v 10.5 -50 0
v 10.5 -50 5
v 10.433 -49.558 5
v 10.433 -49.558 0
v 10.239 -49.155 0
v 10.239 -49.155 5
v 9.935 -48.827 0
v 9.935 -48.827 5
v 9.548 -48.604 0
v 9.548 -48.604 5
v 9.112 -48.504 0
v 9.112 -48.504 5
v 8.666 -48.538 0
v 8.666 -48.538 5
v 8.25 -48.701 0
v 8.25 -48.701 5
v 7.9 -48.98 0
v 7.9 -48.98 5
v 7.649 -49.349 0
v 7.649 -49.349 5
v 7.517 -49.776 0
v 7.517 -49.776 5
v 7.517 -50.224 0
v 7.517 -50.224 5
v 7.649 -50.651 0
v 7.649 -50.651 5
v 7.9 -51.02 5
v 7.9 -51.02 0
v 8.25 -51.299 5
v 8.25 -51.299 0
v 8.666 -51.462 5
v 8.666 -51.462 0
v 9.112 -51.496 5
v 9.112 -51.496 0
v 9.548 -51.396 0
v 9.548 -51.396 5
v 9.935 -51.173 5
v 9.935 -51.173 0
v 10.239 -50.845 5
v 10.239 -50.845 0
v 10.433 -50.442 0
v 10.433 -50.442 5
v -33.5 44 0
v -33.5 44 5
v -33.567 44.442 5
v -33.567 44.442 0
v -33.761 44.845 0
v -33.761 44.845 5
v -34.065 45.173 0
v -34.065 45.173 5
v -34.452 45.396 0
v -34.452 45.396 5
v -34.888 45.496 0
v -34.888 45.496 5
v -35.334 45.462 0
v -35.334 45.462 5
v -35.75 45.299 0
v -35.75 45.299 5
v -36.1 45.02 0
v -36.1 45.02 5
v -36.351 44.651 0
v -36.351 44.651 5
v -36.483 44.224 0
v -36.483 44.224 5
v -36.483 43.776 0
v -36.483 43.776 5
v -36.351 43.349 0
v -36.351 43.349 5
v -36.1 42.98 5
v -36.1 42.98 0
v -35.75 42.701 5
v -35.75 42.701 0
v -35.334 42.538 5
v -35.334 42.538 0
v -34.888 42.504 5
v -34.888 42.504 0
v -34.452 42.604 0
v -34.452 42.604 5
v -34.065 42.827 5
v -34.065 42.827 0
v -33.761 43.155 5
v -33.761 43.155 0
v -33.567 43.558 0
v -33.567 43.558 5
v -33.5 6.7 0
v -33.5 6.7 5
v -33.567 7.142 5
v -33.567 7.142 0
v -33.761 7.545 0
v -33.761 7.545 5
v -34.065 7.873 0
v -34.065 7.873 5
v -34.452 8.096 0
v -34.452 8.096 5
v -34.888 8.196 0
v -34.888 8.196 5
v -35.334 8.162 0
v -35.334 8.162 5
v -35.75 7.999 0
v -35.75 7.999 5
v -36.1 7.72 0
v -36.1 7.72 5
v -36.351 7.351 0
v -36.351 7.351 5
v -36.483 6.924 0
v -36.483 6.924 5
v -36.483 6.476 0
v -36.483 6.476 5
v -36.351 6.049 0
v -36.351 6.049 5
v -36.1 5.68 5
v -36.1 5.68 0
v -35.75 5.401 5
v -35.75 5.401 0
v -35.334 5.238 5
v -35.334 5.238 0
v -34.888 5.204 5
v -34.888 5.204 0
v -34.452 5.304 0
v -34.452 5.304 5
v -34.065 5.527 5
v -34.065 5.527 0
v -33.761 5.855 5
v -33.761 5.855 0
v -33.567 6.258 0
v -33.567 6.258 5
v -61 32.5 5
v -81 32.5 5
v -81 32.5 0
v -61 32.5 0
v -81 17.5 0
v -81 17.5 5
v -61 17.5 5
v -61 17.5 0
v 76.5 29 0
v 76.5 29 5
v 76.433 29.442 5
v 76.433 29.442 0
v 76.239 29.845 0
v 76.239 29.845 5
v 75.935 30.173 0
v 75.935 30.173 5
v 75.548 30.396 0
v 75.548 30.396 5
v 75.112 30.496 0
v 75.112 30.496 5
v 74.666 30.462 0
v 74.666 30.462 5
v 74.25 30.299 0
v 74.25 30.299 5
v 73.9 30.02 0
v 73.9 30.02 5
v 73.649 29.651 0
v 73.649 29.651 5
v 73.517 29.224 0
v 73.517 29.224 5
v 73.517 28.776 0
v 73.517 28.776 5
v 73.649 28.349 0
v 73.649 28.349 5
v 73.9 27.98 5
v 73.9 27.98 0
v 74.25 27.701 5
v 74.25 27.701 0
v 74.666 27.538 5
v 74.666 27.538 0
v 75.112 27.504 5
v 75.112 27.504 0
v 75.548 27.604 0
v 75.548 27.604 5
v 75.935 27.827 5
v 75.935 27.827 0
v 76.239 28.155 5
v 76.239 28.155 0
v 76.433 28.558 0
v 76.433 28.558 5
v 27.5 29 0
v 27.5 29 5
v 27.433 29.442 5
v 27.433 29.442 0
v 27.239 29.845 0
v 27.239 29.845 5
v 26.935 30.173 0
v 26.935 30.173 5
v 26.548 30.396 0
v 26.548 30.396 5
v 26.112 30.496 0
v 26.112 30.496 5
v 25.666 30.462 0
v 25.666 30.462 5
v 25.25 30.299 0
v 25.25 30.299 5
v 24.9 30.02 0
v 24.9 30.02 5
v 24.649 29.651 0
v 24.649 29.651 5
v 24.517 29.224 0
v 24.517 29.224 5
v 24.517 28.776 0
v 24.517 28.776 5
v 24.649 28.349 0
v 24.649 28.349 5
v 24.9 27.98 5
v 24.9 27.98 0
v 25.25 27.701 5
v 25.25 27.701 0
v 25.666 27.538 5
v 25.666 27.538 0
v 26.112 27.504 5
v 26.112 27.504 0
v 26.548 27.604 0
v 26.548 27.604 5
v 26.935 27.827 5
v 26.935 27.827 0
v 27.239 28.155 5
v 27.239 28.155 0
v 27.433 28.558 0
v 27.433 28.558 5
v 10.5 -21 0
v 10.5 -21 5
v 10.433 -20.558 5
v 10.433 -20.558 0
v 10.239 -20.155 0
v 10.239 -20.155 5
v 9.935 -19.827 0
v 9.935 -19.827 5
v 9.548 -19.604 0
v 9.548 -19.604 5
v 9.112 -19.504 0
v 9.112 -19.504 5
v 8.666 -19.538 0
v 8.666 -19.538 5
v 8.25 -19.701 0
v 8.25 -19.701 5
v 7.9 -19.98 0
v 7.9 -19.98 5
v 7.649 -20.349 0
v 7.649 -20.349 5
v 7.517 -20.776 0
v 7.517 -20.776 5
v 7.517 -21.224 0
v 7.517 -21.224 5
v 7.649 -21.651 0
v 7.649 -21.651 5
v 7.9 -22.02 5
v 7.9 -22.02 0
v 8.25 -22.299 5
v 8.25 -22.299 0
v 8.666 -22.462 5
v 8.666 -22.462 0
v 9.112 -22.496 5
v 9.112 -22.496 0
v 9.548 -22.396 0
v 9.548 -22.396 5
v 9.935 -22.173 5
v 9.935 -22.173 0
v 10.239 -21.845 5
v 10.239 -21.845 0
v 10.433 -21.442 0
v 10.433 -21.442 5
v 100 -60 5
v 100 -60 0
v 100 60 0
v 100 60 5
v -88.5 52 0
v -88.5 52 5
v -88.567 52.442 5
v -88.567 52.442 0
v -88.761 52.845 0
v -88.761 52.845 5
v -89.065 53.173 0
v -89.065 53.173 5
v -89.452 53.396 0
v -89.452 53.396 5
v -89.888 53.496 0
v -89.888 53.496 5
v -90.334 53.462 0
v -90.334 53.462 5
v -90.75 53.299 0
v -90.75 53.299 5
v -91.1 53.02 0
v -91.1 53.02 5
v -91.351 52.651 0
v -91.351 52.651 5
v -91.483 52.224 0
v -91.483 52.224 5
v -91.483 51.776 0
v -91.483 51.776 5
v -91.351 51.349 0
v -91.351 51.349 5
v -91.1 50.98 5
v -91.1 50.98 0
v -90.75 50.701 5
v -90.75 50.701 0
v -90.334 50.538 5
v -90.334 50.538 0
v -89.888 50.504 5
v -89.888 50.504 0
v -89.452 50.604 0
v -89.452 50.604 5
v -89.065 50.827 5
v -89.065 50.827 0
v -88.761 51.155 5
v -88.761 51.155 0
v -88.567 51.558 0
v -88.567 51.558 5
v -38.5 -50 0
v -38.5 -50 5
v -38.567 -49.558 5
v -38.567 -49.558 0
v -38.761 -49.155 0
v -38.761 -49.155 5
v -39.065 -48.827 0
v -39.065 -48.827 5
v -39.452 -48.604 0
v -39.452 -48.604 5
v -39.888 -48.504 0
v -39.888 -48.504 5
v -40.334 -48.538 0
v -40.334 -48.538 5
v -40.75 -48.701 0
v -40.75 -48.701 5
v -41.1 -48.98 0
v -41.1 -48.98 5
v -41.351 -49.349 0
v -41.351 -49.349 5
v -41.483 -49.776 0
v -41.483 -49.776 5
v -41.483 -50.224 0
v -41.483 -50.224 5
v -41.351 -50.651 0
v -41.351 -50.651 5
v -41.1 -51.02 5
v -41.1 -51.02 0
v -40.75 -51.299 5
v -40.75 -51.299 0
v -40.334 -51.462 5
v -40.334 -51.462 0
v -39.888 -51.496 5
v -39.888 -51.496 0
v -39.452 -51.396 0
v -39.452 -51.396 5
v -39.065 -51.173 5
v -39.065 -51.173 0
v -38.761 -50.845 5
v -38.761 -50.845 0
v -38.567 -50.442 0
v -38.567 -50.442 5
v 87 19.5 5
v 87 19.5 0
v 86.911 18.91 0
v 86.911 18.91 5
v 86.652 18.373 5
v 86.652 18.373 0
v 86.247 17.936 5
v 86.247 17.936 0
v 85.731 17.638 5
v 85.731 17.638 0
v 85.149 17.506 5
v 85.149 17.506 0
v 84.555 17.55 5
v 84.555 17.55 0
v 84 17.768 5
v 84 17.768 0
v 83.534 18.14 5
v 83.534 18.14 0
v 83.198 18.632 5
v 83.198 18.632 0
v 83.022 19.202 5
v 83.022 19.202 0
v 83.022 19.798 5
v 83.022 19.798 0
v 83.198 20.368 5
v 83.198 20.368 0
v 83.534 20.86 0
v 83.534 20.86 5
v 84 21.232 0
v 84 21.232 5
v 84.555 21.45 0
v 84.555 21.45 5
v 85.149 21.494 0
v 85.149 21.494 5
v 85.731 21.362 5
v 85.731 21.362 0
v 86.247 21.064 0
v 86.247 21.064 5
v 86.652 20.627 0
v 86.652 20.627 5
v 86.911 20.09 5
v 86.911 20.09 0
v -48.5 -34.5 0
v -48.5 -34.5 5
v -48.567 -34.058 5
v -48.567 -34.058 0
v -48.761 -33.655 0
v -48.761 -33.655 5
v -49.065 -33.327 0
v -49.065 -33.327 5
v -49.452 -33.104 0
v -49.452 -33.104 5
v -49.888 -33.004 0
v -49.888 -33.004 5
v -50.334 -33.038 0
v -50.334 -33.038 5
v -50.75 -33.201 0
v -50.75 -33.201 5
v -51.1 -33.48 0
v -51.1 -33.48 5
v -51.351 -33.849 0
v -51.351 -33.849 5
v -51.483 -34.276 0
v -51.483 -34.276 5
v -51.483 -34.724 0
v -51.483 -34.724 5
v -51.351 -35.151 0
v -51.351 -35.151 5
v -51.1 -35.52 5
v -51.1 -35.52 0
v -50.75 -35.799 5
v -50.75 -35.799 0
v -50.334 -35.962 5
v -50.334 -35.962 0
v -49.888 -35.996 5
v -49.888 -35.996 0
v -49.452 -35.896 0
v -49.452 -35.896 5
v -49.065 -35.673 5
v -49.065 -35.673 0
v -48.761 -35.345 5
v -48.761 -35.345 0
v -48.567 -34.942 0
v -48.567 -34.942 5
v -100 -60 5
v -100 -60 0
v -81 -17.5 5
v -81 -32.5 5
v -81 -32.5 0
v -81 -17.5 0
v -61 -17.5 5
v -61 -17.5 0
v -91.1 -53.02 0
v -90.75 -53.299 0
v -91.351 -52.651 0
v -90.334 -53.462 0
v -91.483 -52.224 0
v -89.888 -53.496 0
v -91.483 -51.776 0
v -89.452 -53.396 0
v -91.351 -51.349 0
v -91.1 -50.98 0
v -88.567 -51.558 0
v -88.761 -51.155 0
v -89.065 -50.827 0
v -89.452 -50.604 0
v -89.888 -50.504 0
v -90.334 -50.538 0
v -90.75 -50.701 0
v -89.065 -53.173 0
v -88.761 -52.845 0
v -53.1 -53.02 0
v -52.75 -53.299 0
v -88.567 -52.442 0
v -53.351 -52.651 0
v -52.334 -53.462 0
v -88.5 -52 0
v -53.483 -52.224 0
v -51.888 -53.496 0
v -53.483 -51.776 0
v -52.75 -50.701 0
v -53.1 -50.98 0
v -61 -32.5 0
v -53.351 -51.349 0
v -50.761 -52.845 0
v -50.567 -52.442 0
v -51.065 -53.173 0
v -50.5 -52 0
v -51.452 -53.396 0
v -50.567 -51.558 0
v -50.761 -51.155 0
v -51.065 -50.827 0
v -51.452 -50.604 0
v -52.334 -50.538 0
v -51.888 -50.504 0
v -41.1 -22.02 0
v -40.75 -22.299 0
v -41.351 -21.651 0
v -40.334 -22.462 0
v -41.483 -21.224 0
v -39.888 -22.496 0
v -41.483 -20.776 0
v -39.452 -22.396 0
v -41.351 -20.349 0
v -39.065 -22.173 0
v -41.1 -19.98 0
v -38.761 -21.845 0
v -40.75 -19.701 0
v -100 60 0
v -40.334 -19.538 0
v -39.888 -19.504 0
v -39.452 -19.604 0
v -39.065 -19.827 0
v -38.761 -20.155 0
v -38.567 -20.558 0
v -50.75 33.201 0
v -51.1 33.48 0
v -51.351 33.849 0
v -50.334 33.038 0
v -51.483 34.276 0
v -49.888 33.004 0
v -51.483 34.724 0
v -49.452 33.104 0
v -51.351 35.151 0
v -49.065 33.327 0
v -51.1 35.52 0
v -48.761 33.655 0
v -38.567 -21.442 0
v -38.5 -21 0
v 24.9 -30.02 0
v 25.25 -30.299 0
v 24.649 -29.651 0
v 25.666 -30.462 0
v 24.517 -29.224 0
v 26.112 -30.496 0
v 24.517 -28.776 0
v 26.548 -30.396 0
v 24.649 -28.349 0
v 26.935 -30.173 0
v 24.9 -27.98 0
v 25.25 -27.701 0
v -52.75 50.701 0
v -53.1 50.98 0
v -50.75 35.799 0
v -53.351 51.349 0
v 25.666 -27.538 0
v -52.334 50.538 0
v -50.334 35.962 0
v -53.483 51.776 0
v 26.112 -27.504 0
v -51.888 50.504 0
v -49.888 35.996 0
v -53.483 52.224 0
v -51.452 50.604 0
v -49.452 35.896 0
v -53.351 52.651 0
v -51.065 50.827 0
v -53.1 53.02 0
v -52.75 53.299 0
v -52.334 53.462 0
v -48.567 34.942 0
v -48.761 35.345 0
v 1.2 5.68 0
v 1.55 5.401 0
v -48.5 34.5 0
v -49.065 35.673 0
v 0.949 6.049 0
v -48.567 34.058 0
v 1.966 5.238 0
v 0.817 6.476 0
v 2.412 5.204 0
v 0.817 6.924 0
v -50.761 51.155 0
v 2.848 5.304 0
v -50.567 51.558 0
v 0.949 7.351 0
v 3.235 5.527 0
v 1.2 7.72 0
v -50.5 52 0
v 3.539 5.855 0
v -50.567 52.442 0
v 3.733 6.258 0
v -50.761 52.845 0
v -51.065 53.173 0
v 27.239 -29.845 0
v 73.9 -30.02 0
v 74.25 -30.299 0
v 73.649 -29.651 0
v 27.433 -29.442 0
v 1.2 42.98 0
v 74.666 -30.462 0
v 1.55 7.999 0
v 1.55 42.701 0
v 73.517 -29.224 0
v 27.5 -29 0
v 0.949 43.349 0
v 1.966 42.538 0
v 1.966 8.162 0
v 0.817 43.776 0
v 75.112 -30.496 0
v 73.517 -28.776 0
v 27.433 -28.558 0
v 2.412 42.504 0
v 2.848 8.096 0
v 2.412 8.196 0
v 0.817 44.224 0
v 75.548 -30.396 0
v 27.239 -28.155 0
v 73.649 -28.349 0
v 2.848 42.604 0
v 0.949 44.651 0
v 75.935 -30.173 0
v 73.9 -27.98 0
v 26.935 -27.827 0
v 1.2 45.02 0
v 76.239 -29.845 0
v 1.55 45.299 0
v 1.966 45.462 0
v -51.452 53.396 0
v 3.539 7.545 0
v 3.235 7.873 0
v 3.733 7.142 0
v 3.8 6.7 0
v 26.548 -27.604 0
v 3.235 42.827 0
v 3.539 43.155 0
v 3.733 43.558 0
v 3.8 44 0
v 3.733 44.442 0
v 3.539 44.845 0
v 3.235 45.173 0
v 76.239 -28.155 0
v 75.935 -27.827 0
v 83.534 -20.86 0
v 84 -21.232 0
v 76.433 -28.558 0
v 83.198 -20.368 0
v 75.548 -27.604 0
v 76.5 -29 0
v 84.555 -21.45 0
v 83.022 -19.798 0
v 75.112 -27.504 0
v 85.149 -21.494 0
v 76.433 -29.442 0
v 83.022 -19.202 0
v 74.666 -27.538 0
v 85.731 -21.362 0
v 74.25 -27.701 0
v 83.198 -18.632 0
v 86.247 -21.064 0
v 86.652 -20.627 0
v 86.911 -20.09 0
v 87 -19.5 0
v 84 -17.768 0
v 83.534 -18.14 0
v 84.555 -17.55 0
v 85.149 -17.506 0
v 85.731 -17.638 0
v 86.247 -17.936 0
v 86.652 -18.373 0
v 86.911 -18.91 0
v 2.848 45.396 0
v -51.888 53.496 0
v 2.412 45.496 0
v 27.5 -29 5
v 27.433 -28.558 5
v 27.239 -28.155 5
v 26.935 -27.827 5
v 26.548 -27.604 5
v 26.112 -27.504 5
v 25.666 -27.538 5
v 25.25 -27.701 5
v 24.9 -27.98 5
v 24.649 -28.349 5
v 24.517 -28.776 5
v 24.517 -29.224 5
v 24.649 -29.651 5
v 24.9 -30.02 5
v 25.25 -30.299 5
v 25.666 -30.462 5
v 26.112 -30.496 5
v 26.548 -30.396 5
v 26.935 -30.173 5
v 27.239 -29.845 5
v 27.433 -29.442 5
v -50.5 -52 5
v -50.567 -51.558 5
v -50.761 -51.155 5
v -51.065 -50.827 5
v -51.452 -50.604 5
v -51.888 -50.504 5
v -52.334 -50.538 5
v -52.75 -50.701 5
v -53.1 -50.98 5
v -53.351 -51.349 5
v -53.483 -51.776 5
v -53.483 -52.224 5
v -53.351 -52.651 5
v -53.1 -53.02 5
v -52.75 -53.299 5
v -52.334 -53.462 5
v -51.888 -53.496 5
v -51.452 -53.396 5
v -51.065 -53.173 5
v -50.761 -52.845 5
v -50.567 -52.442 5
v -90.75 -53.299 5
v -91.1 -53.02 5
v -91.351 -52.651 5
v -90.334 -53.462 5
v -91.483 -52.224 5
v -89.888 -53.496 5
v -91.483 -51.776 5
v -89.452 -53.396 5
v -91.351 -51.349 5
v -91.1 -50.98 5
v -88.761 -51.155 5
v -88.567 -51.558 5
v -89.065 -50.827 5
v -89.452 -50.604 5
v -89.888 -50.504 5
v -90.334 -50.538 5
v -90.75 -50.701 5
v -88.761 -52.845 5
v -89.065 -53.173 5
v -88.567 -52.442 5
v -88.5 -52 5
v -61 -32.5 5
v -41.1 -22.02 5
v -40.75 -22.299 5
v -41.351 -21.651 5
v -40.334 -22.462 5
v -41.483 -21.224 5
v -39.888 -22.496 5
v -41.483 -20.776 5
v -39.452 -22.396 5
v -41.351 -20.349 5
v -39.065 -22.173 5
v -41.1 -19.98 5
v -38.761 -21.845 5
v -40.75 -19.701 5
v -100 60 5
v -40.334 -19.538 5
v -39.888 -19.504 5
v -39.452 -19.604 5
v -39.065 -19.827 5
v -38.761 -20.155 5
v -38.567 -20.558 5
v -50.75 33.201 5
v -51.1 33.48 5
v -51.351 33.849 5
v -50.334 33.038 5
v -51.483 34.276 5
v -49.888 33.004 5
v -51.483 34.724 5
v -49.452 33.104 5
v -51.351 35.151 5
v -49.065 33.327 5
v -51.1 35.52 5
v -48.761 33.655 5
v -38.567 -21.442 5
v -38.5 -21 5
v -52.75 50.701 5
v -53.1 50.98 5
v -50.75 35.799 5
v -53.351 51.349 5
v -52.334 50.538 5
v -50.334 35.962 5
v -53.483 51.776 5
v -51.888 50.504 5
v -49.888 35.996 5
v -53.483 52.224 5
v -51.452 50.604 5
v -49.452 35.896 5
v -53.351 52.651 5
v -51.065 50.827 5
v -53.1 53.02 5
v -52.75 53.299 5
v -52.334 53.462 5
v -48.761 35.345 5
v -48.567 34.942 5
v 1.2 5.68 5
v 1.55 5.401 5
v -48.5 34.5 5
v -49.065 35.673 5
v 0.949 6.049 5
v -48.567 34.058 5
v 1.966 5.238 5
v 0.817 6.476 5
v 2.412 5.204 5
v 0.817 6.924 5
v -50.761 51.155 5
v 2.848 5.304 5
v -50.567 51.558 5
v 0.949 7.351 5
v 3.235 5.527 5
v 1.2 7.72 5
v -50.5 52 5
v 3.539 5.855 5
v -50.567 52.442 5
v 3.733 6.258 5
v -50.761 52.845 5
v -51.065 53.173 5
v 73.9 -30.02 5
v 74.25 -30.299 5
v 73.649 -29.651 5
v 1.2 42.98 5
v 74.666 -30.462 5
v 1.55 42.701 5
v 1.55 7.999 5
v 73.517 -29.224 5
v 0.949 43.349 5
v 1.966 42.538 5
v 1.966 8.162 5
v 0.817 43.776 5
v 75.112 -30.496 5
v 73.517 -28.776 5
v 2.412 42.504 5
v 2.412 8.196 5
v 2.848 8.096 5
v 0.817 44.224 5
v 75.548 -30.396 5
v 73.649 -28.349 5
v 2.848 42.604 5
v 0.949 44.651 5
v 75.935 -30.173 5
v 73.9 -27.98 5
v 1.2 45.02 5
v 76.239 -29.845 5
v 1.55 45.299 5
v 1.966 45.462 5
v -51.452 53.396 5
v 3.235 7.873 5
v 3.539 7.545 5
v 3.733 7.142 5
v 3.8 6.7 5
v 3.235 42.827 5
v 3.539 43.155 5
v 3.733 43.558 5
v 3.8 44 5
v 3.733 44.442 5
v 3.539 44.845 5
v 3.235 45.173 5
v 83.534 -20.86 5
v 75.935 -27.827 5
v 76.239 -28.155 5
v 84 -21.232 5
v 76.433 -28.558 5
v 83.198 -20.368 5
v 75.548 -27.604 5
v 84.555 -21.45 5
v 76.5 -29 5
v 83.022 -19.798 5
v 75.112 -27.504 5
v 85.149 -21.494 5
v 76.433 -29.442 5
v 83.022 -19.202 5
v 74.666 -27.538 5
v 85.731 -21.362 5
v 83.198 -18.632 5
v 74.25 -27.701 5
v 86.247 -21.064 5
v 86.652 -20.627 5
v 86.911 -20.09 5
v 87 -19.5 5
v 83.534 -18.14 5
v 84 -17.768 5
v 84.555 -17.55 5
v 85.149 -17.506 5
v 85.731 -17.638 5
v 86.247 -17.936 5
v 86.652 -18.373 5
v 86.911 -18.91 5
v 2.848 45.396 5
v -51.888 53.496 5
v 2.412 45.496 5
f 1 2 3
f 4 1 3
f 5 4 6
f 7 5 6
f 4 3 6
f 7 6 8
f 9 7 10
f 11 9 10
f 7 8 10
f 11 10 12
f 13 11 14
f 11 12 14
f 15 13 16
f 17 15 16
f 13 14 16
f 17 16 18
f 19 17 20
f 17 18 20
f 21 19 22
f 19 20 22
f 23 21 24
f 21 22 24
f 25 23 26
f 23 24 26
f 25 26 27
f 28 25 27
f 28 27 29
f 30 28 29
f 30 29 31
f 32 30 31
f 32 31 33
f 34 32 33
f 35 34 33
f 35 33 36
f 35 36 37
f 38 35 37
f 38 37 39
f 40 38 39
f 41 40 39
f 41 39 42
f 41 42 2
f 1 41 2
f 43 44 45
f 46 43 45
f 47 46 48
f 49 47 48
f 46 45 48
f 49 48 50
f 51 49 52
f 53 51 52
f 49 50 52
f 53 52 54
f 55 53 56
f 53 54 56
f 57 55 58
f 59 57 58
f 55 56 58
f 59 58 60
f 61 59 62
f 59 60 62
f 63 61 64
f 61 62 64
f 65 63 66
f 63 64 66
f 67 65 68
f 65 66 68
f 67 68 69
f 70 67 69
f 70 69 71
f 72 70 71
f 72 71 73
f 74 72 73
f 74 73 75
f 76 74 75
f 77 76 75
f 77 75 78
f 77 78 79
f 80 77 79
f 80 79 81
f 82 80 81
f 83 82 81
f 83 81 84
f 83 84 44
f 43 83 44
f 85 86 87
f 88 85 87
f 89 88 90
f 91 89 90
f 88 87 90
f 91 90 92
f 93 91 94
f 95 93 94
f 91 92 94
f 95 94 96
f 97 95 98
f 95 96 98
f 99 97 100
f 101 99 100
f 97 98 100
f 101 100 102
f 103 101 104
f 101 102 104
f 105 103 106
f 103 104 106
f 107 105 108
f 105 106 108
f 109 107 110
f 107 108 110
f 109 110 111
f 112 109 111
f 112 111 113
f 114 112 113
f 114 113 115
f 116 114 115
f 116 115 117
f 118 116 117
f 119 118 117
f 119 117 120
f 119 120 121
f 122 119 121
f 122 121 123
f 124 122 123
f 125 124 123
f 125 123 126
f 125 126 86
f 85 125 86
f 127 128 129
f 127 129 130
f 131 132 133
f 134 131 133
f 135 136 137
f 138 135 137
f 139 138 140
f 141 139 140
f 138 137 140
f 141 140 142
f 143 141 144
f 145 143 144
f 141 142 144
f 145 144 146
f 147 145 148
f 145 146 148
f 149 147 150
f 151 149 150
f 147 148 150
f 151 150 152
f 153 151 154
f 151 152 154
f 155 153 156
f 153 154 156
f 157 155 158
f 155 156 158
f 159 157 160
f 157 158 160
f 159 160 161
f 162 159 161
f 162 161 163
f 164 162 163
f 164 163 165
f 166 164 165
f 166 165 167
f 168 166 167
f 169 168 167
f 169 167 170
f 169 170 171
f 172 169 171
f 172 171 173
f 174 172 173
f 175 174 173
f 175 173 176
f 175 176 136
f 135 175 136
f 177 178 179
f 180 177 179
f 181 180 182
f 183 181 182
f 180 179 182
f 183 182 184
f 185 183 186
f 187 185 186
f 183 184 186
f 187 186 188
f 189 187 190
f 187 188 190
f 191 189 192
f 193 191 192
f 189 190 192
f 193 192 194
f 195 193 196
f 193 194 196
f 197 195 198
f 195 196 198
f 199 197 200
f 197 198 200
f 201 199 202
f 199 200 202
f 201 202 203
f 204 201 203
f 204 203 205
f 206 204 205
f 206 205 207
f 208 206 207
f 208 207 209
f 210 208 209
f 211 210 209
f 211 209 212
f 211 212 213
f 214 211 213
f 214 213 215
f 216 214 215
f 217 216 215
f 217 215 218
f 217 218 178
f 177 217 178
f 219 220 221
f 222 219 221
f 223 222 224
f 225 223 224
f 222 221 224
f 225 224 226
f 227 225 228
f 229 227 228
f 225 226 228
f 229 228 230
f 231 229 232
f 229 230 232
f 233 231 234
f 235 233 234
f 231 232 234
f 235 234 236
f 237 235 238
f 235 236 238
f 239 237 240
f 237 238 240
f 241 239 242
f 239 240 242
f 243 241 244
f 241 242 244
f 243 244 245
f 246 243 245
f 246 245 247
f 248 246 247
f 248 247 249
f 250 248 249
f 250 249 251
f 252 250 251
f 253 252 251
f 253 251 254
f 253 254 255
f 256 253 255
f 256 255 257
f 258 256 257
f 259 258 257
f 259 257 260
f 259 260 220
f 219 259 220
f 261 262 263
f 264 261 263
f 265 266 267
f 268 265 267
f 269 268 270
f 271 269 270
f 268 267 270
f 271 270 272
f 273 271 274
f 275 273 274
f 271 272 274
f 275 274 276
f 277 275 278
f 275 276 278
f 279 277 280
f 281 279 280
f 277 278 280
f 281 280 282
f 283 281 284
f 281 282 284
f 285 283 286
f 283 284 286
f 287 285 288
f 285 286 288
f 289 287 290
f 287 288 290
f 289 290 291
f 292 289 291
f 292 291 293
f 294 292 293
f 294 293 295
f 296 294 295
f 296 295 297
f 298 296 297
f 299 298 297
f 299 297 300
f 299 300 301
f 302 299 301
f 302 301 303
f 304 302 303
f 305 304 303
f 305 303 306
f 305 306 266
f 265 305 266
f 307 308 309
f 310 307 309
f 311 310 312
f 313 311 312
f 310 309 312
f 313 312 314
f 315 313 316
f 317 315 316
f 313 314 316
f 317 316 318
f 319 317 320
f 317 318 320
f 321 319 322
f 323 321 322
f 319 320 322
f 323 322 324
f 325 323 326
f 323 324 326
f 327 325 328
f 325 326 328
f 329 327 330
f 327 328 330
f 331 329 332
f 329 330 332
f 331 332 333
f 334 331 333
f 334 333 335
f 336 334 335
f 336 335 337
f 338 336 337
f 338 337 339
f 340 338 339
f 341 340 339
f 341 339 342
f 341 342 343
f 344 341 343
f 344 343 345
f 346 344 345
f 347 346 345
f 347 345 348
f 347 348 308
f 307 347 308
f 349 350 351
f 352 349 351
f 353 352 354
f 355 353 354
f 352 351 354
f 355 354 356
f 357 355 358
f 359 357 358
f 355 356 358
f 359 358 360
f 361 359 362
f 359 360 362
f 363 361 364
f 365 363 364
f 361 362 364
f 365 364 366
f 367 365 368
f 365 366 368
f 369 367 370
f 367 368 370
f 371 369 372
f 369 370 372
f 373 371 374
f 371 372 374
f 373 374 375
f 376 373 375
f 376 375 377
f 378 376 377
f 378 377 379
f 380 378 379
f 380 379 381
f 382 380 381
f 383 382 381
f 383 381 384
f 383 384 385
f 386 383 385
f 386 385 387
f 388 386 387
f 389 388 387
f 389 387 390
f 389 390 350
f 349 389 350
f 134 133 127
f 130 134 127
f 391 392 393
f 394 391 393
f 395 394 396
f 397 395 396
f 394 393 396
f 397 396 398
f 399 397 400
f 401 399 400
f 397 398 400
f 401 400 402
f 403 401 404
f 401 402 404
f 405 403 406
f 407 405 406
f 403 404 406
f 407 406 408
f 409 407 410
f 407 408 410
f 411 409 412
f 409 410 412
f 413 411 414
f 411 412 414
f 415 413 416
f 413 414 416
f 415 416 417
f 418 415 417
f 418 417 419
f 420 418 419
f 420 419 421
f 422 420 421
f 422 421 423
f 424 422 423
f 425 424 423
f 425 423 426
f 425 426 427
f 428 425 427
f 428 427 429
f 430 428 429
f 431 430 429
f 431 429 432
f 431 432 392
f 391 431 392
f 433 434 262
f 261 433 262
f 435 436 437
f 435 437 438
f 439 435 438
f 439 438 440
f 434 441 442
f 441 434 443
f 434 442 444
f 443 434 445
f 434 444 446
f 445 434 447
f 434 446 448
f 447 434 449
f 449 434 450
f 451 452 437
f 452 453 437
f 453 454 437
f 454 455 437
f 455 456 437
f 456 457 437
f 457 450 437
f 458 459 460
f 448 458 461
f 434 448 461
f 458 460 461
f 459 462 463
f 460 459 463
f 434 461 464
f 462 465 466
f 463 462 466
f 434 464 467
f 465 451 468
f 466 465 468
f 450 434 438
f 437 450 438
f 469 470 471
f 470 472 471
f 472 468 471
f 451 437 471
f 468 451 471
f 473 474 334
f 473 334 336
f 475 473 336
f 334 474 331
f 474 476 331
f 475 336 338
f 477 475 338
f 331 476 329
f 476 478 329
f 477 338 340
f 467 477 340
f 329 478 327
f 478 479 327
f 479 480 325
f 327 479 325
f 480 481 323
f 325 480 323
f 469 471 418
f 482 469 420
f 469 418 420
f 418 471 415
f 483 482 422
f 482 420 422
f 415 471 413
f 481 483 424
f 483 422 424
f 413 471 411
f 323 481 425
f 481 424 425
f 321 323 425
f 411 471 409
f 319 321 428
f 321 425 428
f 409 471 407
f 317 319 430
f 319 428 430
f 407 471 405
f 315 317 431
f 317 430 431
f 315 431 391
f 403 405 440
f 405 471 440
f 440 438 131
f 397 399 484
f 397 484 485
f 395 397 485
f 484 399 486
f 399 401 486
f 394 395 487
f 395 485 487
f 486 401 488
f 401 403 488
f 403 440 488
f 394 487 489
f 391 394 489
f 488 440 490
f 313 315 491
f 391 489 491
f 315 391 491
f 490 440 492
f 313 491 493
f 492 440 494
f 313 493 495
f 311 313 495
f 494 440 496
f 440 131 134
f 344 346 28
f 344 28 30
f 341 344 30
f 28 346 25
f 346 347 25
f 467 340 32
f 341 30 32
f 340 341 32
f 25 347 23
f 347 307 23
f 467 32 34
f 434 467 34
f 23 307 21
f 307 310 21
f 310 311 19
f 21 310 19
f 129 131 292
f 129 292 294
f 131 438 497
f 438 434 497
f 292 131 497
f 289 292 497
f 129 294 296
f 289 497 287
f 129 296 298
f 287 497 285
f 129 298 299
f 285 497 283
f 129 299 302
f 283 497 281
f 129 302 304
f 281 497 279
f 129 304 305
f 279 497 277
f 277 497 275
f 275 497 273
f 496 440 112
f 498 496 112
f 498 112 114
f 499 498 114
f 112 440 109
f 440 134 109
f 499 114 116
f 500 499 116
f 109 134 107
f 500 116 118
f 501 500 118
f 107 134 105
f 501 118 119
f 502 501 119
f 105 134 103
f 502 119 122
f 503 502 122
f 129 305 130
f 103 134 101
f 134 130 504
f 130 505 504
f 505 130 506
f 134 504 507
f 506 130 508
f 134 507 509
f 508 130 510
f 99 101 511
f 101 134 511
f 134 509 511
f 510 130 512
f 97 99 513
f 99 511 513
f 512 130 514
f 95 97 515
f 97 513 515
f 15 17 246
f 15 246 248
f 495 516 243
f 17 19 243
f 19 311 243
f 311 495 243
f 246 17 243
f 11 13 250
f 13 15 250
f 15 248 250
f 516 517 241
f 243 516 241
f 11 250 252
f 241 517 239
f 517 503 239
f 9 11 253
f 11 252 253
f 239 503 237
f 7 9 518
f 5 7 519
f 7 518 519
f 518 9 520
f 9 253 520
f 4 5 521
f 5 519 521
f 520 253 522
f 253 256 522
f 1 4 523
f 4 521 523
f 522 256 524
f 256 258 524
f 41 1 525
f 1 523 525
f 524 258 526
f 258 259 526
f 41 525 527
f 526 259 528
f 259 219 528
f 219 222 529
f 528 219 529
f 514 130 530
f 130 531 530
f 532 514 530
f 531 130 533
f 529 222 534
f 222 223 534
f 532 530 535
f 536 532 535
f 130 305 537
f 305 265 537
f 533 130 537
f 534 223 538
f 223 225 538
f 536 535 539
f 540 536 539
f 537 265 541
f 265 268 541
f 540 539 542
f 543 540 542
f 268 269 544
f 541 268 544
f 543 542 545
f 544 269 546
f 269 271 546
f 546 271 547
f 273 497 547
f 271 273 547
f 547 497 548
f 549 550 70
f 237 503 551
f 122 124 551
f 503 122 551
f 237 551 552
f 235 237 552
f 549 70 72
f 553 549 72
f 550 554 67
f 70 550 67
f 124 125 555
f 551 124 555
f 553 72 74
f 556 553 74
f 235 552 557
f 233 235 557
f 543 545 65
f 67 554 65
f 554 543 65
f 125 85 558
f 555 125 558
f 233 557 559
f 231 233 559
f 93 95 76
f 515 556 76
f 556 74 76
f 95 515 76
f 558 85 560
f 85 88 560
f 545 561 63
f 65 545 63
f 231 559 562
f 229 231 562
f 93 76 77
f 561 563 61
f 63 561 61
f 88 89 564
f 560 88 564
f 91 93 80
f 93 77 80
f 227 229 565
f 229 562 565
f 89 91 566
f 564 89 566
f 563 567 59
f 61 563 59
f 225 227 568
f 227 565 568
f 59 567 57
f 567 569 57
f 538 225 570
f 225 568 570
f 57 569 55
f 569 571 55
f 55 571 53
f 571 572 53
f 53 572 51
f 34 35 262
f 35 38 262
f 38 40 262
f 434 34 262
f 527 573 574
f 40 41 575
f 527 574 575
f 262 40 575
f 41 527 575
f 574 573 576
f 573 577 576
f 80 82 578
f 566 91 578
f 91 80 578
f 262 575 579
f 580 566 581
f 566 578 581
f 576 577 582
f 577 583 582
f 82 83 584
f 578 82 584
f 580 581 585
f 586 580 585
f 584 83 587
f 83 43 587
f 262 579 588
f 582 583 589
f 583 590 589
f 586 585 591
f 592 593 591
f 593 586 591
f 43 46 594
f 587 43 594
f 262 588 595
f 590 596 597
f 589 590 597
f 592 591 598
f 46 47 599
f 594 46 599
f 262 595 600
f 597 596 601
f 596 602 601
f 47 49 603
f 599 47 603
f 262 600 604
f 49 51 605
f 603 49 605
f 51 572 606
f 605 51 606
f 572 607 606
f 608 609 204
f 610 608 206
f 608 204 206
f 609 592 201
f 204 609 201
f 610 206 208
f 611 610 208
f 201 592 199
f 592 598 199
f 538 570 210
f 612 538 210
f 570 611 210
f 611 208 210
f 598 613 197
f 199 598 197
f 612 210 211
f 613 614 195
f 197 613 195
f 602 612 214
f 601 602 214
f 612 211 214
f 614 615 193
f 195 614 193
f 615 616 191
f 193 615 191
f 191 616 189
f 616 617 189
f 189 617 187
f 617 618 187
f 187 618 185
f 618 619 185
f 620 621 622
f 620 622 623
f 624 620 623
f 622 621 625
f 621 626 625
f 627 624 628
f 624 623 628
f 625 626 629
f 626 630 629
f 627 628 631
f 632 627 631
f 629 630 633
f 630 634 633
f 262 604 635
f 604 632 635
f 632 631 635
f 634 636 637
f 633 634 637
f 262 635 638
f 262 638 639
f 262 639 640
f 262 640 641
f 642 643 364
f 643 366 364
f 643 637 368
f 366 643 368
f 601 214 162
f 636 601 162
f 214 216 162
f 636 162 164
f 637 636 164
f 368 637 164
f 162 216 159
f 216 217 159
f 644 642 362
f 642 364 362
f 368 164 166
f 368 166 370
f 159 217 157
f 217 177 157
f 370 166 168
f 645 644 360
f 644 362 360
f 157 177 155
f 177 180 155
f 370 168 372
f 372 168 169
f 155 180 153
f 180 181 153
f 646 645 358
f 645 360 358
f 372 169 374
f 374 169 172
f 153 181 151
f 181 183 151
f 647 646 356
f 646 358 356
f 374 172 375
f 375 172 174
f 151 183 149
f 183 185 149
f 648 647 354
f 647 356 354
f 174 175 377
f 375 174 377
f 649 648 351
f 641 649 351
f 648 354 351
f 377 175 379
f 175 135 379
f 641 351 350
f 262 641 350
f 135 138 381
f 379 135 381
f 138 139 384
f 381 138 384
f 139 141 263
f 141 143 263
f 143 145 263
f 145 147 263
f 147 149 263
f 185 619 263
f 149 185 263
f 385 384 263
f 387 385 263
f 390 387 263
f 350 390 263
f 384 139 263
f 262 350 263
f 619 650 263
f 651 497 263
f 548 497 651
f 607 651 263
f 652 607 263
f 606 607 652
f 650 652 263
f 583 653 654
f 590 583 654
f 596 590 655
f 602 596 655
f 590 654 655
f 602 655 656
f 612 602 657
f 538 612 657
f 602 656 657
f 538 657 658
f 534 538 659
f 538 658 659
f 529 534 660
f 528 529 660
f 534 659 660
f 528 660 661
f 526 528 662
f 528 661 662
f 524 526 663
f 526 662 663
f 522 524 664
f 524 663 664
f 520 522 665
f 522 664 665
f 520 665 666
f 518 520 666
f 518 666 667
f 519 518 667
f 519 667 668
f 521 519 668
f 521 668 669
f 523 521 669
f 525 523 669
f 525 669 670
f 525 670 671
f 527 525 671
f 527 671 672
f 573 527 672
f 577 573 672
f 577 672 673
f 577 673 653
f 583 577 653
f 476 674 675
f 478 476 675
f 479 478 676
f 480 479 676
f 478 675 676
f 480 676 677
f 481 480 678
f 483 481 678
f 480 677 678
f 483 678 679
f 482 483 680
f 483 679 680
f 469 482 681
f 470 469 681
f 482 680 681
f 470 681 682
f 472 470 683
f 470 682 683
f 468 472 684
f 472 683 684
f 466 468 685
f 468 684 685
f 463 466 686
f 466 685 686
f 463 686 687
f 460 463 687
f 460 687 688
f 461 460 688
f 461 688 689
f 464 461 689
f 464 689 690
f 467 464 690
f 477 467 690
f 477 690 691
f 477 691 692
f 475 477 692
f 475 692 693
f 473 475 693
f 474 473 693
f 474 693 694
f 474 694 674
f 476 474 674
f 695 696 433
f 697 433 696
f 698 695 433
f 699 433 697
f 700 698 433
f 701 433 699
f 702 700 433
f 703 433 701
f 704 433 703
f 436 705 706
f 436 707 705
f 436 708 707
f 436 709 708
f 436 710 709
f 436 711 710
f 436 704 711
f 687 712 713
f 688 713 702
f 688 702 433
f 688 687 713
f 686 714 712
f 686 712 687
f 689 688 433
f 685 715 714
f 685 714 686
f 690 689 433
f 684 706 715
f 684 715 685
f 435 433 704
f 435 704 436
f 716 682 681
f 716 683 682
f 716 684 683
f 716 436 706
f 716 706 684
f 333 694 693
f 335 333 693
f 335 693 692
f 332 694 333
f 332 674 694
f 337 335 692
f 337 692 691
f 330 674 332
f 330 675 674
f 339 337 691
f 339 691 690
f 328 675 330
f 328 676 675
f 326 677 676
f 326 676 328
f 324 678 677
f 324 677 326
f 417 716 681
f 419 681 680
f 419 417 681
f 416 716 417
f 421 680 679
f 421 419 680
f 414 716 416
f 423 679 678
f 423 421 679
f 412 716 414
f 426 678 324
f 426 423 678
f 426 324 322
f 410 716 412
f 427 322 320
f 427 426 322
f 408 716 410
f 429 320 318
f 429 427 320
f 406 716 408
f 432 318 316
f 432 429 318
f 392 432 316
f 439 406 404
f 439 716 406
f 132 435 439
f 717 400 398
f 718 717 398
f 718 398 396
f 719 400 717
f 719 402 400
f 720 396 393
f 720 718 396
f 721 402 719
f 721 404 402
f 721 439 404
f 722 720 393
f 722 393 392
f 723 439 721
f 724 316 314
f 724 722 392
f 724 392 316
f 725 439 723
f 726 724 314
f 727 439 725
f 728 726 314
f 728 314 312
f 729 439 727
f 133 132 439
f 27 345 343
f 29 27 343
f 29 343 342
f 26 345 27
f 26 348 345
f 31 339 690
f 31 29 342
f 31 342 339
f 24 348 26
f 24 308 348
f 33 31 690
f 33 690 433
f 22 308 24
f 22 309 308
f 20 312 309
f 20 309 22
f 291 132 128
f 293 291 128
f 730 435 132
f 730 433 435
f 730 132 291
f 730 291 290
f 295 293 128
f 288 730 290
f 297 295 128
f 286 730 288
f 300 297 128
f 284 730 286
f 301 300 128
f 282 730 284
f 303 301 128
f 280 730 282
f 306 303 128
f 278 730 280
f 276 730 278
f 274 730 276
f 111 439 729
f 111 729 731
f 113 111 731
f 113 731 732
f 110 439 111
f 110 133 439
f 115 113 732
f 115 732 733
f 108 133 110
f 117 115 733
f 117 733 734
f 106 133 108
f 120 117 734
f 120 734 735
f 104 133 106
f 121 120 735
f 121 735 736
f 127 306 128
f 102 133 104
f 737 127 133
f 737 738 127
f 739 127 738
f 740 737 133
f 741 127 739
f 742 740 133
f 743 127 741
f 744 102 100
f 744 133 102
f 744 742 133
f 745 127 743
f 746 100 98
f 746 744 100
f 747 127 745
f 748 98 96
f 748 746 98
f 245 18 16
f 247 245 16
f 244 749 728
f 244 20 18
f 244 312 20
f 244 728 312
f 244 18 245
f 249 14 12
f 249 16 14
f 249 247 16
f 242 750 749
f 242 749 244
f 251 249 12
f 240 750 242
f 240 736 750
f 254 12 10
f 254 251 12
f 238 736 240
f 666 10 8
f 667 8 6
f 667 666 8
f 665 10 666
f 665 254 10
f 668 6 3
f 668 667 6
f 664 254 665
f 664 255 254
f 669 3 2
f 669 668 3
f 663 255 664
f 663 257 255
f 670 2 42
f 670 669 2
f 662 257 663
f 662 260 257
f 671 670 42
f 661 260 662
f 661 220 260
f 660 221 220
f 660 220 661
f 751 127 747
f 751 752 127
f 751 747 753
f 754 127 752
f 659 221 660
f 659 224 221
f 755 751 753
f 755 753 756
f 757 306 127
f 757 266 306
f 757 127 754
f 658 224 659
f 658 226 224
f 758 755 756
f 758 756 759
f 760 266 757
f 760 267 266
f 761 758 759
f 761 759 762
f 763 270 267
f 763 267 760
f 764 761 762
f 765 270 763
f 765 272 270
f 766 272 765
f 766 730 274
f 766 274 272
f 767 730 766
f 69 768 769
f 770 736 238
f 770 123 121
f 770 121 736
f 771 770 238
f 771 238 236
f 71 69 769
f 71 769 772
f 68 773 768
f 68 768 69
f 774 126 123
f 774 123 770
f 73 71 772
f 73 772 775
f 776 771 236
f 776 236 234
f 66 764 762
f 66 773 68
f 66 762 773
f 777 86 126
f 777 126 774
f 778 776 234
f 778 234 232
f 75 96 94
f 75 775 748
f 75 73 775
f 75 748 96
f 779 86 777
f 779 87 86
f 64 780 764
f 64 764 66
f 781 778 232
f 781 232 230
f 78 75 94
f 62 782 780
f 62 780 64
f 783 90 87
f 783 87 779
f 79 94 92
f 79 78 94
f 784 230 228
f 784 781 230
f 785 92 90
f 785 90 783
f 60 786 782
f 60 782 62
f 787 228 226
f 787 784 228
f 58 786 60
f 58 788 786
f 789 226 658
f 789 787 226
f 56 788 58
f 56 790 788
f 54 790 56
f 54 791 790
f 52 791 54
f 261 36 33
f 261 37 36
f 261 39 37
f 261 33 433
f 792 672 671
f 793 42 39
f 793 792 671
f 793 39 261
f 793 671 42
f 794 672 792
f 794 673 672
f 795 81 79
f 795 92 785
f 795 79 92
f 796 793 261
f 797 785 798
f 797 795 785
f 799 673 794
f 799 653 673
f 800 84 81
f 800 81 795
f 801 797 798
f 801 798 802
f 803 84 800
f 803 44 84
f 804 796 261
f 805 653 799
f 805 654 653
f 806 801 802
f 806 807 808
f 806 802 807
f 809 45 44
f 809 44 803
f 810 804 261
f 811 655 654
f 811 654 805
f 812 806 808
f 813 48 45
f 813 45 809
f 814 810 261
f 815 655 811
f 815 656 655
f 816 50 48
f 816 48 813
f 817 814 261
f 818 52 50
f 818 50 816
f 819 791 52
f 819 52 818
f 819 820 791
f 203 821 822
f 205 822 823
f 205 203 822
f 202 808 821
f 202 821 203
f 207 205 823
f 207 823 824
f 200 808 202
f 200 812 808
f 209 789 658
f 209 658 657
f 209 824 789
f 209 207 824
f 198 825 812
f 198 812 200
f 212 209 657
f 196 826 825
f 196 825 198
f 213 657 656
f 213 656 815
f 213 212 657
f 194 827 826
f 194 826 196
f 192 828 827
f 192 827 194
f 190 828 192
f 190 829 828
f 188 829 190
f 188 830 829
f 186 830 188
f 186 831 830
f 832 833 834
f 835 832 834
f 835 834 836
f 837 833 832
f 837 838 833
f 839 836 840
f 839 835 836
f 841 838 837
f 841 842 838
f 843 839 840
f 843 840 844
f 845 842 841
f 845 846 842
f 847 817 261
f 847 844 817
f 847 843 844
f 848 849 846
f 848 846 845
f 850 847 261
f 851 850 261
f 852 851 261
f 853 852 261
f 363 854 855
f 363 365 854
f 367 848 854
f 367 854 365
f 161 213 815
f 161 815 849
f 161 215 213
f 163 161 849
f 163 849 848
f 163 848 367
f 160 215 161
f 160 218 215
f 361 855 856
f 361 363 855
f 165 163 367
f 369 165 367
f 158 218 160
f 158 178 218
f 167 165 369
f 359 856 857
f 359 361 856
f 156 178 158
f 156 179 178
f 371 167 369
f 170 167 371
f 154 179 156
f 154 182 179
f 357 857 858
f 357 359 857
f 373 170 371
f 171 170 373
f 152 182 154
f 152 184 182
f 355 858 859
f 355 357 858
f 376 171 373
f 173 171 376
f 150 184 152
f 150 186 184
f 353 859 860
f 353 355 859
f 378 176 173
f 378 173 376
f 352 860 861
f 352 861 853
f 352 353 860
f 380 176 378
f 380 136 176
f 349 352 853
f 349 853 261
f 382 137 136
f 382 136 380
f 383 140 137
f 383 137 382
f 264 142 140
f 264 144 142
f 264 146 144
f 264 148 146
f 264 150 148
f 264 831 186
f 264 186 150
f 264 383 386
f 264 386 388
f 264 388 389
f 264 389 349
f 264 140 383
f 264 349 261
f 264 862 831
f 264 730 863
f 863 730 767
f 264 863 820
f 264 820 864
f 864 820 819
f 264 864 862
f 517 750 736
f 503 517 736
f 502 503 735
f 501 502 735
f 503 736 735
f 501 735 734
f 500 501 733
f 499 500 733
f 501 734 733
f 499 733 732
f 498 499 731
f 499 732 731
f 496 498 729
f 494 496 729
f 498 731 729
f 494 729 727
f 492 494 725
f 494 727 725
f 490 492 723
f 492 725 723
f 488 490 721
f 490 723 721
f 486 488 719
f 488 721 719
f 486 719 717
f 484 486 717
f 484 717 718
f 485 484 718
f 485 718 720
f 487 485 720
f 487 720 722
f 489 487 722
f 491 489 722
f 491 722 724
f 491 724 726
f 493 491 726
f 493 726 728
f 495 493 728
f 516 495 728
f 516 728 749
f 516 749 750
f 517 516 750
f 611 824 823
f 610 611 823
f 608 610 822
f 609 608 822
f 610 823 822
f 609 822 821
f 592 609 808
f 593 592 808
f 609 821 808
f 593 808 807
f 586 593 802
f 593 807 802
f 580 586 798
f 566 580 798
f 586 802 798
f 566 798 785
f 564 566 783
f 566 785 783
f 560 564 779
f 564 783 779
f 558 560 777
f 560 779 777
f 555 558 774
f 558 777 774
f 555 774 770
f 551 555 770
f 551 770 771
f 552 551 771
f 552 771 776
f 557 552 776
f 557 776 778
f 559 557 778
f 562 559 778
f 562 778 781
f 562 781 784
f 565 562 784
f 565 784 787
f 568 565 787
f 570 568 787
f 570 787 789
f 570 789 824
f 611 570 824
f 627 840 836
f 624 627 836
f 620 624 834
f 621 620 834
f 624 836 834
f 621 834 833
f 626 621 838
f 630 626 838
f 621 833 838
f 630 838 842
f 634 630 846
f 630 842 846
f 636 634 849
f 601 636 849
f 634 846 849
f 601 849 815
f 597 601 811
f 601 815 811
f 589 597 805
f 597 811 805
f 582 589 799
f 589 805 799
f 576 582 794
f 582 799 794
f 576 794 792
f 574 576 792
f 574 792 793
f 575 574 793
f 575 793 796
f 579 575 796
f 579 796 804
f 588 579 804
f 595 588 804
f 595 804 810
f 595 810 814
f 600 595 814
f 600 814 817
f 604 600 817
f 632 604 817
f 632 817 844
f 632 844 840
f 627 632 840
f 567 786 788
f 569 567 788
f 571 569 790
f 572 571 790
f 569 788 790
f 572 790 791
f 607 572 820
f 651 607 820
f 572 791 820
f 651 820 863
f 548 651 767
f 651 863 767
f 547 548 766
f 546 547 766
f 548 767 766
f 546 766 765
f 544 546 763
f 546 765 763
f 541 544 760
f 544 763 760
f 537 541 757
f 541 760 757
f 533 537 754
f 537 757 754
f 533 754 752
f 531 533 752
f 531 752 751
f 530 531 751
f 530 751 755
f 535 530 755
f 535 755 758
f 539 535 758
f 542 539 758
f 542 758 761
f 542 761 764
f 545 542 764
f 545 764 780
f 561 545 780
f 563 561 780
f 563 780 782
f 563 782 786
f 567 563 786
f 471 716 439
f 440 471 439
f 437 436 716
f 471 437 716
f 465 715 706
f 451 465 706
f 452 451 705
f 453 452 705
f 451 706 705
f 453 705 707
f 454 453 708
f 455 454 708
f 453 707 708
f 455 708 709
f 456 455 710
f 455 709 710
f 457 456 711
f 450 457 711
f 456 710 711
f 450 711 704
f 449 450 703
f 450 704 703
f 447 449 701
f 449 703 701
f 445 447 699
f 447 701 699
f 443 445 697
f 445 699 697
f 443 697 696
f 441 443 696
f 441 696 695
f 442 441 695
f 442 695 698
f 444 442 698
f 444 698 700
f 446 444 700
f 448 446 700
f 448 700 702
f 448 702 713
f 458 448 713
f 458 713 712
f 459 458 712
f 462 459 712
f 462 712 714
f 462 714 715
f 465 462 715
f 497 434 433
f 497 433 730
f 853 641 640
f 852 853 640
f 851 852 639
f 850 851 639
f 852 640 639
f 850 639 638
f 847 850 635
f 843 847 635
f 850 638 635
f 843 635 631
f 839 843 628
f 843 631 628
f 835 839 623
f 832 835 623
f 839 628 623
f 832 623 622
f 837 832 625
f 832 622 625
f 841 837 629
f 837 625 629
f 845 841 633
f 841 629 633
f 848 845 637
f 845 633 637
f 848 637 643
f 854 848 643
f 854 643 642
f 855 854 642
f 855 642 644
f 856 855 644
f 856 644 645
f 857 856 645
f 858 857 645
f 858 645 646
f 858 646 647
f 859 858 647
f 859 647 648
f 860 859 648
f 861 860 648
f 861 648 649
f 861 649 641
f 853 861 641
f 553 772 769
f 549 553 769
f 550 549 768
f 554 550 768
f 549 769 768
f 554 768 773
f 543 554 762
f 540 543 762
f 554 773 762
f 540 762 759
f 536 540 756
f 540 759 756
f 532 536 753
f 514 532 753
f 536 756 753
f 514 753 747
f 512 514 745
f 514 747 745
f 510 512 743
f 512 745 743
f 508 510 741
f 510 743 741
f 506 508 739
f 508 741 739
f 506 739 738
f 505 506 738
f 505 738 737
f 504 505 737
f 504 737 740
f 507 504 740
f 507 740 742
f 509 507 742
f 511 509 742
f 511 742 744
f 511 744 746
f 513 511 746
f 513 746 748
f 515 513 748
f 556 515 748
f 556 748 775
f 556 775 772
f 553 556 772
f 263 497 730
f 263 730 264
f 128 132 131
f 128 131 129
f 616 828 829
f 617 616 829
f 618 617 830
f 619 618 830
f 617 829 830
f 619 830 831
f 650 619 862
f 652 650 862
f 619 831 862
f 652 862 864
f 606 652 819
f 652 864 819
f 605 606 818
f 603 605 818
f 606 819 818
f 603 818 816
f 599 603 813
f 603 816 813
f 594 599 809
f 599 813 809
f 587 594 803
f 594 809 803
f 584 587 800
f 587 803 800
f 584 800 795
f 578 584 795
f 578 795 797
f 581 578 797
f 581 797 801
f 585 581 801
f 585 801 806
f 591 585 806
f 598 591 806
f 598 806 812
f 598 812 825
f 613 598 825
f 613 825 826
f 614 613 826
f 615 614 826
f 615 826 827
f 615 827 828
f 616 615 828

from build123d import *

# Parameters (mm, degrees)
F0_W      = 200
F0_H      = 120
F1_DEPTH  = 5
F2_R      = 1.5
F2_W      = 20
F2_H      = 15
F3_DEPTH  = 25
F4_R      = 1.5
F5_DEPTH  = 5.001
F6_R      = 2
F7_DEPTH  = 5.001
F8_R      = 1.5
F9_DEPTH  = 5.001
F10_R     = 1.5
F11_DEPTH = 5.001
F12_R     = 1.5
F13_DEPTH = 5.001


with BuildPart() as f1:
    # F0 (on Top) → F1 (new body)
    with BuildSketch(Plane.XY):
        Rectangle(F0_W, F0_H)
    extrude(amount=F1_DEPTH)

    # F2 (on face) → F3 (cut)
    with BuildSketch(Plane.XY.offset(5)):
        with Locations((-90, 52)):
            Circle(F2_R)
        with Locations((-52, 52)):
            Circle(F2_R)
        with Locations((-90, -52)):
            Circle(F2_R)
        with Locations((-52, -52)):
            Circle(F2_R)
        with Locations((-71, 25)):
            Rectangle(F2_W, F2_H)
        with Locations((-71, -25)):
            Rectangle(F2_W, F2_H)
    extrude(amount=-F3_DEPTH, mode=Mode.SUBTRACT)

    # F4 (on face) → F5 (cut, through all)
    with BuildSketch(Plane.XY.offset(5)):
        with Locations((26, -29)):
            Circle(F4_R)
        with Locations((26, 29)):
            Circle(F4_R)
        with Locations((75, -29)):
            Circle(F4_R)
        with Locations((75, 29)):
            Circle(F4_R)
    extrude(amount=-F5_DEPTH, mode=Mode.SUBTRACT)

    # F6 (on face) → F7 (cut, through all)
    with BuildSketch(Plane(origin=(0, 0, 0), x_dir=(1, 0, 0), z_dir=(0, 0, -1))):
        with Locations((85, 19.5)):
            Circle(F6_R)
        with Locations((85, -19.5)):
            Circle(F6_R)
    extrude(amount=-F7_DEPTH, mode=Mode.SUBTRACT)

    # F8 (on face) → F9 (cut, through all)
    with BuildSketch(Plane.XY.offset(5)):
        with Locations((-35, 44)):
            Circle(F8_R)
        with Locations((-35, 6.7)):
            Circle(F8_R)
        with Locations((2.3, 44)):
            Circle(F8_R)
        with Locations((2.3, 6.7)):
            Circle(F8_R)
    extrude(amount=-F9_DEPTH, mode=Mode.SUBTRACT)

    # F10 (on face) → F11 (cut, through all)
    with BuildSketch(Plane.XY.offset(5)):
        with Locations((-40, -21)):
            Circle(F10_R)
        with Locations((-40, -50)):
            Circle(F10_R)
        with Locations((9, -21)):
            Circle(F10_R)
        with Locations((9, -50)):
            Circle(F10_R)
    extrude(amount=-F11_DEPTH, mode=Mode.SUBTRACT)

    # F12 (on face) → F13 (cut, through all)
    with BuildSketch(Plane.XY.offset(5)):
        with Locations((-50, 34.5)):
            Circle(F12_R)
        with Locations((-50, -34.5)):
            Circle(F12_R)
    extrude(amount=-F13_DEPTH, mode=Mode.SUBTRACT)


solid = f1.part
